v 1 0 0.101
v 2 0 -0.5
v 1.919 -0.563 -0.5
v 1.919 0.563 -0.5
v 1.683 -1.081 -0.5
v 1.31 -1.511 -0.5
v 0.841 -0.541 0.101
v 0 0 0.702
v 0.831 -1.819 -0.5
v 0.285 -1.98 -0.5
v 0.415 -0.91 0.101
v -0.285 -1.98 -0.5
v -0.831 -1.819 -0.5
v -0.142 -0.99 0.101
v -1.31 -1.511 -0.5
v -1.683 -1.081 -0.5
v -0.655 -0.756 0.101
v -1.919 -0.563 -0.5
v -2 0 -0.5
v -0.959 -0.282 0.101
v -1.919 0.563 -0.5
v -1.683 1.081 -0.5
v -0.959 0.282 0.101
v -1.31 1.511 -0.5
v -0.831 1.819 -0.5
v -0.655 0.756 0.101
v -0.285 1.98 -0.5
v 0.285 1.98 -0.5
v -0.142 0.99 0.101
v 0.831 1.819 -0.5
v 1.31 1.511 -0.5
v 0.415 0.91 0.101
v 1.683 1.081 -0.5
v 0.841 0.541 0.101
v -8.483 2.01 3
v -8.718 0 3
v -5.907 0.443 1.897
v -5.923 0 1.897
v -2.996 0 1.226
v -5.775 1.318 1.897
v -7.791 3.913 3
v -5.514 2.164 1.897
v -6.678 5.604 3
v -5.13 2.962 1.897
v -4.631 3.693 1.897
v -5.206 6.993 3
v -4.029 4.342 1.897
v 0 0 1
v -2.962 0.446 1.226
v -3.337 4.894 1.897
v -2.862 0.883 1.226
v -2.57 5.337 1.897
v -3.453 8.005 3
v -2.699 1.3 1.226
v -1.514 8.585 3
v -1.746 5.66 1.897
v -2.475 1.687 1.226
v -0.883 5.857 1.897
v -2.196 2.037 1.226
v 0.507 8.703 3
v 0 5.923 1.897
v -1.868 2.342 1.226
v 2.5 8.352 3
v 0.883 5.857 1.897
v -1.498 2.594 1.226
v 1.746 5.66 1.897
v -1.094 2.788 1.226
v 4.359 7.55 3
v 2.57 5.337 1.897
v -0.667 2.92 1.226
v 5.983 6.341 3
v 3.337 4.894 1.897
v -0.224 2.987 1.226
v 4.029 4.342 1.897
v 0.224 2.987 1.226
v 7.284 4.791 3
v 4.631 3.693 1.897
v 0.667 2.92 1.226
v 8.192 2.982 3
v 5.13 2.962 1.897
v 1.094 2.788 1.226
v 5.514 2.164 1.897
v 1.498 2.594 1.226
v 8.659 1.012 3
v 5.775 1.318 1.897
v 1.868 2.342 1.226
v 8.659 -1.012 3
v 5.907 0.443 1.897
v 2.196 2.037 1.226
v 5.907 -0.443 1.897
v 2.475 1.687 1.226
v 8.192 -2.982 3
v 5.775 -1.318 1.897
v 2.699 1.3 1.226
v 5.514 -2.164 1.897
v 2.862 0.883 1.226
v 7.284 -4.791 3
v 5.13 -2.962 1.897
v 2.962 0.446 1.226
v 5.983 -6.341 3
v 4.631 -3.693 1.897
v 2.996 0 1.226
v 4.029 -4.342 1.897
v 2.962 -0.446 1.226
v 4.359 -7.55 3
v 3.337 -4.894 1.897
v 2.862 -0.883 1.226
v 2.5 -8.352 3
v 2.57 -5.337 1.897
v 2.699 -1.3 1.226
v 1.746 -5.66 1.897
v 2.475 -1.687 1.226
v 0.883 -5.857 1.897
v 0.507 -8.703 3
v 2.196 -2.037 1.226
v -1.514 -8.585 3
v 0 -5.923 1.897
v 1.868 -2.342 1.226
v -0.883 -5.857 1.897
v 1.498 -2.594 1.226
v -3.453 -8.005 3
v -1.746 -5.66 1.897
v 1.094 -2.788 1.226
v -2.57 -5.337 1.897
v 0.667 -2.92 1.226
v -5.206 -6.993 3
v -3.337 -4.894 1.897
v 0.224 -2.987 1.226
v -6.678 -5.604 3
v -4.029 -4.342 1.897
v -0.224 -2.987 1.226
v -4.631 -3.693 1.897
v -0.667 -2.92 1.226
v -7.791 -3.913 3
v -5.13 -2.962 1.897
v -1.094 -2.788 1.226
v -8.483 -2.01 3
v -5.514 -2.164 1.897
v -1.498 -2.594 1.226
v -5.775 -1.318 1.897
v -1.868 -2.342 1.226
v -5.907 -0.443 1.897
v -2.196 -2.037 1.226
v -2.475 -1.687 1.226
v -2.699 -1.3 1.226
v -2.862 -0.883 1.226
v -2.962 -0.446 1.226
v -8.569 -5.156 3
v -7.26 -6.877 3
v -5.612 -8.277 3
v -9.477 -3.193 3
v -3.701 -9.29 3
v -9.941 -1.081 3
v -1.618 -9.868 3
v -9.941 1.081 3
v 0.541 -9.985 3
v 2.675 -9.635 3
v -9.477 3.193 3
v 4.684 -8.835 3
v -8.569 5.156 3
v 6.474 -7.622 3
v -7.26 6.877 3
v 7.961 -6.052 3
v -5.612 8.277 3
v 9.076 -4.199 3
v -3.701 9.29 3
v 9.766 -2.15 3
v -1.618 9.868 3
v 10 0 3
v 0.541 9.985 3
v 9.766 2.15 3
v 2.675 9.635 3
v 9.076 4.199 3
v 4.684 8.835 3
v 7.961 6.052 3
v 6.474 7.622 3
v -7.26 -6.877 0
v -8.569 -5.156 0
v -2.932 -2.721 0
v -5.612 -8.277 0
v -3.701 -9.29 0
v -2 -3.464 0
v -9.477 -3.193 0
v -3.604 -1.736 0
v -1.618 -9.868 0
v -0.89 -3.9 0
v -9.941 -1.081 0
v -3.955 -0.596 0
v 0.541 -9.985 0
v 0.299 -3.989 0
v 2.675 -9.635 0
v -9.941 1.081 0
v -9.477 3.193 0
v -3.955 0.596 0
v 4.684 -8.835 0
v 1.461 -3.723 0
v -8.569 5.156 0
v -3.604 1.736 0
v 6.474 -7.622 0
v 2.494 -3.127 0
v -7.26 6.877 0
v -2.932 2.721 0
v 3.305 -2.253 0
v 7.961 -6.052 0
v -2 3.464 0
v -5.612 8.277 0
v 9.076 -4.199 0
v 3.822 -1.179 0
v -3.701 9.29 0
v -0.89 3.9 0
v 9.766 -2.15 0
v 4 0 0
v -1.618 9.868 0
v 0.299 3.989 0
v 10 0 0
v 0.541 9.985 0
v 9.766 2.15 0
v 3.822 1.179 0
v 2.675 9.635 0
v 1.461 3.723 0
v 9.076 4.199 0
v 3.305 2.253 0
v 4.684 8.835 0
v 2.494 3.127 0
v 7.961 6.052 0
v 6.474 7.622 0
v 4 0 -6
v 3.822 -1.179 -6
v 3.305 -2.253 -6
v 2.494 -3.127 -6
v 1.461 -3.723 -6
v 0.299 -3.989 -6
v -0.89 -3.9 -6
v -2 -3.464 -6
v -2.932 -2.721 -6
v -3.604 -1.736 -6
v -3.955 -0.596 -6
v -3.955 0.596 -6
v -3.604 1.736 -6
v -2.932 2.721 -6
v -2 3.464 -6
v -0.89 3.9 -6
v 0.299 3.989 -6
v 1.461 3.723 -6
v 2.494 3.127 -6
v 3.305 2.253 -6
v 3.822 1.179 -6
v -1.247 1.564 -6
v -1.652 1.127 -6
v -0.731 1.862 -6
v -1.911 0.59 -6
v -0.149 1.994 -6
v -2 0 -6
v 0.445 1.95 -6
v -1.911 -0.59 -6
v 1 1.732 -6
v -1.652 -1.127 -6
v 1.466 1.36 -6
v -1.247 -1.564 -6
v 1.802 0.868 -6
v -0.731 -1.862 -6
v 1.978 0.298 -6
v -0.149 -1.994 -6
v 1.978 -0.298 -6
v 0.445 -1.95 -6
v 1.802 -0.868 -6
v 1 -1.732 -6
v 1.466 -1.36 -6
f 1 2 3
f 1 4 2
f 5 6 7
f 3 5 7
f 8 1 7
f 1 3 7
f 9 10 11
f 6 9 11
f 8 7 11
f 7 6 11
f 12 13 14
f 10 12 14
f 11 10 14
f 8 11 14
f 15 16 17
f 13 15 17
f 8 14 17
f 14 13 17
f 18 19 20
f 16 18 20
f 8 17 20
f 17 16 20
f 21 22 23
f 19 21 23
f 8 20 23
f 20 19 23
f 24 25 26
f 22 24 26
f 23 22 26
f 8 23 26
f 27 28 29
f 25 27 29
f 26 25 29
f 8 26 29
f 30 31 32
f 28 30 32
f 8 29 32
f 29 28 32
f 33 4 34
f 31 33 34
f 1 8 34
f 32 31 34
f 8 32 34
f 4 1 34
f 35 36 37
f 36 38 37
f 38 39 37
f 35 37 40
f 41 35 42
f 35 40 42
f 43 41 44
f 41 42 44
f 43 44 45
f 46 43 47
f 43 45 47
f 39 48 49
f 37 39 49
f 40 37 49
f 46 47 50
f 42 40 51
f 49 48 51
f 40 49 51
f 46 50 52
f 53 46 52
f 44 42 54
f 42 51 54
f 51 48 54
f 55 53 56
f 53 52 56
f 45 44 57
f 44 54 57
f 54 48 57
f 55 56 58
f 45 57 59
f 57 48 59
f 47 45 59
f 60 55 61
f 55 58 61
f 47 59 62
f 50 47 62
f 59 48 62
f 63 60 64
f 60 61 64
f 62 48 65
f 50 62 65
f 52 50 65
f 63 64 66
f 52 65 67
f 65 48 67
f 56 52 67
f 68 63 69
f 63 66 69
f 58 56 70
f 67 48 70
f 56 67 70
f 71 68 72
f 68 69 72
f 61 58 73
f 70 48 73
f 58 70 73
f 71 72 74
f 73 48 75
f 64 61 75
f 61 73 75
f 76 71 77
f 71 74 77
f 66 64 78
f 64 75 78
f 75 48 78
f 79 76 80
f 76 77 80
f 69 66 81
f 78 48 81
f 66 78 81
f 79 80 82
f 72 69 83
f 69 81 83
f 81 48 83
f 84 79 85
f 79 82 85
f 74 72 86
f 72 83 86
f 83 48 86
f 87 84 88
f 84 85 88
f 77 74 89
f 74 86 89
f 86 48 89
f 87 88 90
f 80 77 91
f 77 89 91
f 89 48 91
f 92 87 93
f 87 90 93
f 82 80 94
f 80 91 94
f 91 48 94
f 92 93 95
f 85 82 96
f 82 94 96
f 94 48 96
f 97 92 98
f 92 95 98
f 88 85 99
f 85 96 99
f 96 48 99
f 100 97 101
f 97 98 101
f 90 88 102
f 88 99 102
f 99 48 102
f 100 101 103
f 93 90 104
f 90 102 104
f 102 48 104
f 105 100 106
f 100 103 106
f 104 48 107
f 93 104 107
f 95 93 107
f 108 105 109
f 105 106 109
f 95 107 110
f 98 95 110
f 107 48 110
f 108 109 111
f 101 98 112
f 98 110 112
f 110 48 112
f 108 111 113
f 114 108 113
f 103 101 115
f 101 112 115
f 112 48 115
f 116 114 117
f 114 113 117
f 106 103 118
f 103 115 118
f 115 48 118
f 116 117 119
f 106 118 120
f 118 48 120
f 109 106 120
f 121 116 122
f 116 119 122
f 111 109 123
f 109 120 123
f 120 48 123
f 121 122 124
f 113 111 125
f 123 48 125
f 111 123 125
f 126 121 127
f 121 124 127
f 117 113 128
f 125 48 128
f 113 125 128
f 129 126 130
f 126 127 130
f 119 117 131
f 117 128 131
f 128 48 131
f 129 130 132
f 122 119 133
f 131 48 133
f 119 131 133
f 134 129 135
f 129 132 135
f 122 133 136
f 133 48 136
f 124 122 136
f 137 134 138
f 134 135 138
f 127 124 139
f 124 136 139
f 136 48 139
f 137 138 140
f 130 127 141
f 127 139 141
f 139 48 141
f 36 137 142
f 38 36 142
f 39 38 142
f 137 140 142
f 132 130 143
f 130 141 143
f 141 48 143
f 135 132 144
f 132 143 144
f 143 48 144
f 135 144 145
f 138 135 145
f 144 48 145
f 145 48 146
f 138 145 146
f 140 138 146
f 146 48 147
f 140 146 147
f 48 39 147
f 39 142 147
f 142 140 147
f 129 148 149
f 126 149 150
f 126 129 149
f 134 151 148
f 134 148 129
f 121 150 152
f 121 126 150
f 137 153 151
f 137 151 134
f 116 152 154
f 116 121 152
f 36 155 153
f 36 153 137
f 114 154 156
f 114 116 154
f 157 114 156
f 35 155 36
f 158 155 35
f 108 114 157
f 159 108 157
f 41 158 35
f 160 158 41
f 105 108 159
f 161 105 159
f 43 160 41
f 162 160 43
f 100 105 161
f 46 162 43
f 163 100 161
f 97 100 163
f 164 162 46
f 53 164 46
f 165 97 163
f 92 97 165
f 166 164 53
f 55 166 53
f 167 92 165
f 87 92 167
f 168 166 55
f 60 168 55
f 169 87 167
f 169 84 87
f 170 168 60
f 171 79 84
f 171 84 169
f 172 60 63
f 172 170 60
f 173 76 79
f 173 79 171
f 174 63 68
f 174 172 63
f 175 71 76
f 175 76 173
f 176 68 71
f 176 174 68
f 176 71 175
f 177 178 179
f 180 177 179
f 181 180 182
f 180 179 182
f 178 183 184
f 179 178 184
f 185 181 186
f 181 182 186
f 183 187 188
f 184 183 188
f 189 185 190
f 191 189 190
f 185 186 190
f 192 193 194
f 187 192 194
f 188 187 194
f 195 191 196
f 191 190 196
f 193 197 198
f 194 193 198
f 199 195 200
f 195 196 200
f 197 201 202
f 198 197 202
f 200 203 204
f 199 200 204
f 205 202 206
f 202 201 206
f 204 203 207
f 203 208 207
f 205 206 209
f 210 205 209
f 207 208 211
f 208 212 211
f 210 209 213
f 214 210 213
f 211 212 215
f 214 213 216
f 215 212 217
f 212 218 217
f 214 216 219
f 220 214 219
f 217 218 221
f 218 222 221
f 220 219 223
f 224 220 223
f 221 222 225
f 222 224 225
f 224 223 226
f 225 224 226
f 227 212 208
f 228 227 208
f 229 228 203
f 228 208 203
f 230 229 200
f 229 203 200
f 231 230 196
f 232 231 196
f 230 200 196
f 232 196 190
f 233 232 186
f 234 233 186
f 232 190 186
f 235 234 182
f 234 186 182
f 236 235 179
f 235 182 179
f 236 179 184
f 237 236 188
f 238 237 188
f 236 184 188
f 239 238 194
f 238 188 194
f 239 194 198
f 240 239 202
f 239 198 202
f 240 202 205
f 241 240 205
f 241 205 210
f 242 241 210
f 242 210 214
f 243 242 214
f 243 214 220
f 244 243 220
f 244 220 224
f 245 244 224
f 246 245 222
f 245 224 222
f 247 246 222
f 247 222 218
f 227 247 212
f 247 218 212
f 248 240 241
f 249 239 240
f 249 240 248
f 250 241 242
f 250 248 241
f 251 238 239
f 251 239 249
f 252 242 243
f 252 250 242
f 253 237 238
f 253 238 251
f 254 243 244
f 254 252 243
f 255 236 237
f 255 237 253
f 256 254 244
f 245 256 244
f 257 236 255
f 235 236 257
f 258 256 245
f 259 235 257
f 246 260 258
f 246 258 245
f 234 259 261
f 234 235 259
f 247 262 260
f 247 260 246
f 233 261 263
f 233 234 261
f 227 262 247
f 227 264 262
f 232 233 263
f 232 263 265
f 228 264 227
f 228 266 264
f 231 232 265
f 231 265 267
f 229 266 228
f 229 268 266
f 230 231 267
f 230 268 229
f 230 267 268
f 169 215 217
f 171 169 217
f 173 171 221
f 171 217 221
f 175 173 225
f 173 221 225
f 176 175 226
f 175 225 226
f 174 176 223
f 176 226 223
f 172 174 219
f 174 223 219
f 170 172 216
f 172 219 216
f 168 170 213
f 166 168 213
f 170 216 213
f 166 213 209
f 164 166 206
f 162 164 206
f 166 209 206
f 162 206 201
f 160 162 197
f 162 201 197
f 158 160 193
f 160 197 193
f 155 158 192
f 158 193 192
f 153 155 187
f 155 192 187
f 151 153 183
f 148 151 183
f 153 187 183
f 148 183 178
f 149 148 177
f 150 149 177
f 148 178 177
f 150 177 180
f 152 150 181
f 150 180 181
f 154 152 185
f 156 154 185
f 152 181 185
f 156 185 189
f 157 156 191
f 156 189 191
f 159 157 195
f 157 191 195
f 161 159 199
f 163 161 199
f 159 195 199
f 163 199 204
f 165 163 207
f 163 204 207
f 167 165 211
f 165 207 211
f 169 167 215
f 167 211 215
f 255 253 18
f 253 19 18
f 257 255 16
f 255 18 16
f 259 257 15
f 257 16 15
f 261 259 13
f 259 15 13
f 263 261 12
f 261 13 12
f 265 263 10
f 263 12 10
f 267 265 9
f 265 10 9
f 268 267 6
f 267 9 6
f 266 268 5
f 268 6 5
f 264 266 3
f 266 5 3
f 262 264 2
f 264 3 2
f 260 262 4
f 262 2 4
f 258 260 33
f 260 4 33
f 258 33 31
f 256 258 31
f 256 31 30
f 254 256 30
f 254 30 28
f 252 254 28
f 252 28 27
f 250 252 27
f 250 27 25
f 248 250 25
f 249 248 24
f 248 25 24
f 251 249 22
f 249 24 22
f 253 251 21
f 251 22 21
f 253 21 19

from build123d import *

# Parameters (mm, degrees)
F0_R     = 10
F1_DEPTH = 3
F4_R     = 4
F5_DEPTH = 6
F7_D     = 4
F7_DEPTH = 5.5
F7_TIP   = 1.2017212381


with BuildPart() as f1:
    # F0 (on Top) → F1 (new body)
    with BuildSketch(Plane.XY):
        Circle(F0_R)
    extrude(amount=F1_DEPTH)

    # F2 (on Front) → F3 (revolve, cut)
    with BuildSketch(Plane.XZ):
        with BuildLine():
            Line((0, 1), (0, 41))
            ThreePointArc((0, 41), (-20, 21), (0, 1))
        make_face()
    revolve(axis=Axis((0, 0, 27.4340542965), (0, 0, -1)), mode=Mode.SUBTRACT)

    # F4 (on face) → F5 (join)
    with BuildSketch(Plane(origin=(0, 0, 0), x_dir=(1, 0, 0), z_dir=(0, 0, -1))):
        Circle(F4_R)
    extrude(amount=F5_DEPTH)

    # F7
    with Locations(Plane(origin=(0, 0, -6), x_dir=(1, 0, 0), z_dir=(0, 0, -1))):
        with Locations((0, 0)):
            Hole(F7_D / 2, depth=F7_DEPTH)
            with Locations((0, 0, -(F7_DEPTH + F7_TIP / 2))):  # 118° drill point
                Cone(0, F7_D / 2, F7_TIP, mode=Mode.SUBTRACT)


solid = f1.part
